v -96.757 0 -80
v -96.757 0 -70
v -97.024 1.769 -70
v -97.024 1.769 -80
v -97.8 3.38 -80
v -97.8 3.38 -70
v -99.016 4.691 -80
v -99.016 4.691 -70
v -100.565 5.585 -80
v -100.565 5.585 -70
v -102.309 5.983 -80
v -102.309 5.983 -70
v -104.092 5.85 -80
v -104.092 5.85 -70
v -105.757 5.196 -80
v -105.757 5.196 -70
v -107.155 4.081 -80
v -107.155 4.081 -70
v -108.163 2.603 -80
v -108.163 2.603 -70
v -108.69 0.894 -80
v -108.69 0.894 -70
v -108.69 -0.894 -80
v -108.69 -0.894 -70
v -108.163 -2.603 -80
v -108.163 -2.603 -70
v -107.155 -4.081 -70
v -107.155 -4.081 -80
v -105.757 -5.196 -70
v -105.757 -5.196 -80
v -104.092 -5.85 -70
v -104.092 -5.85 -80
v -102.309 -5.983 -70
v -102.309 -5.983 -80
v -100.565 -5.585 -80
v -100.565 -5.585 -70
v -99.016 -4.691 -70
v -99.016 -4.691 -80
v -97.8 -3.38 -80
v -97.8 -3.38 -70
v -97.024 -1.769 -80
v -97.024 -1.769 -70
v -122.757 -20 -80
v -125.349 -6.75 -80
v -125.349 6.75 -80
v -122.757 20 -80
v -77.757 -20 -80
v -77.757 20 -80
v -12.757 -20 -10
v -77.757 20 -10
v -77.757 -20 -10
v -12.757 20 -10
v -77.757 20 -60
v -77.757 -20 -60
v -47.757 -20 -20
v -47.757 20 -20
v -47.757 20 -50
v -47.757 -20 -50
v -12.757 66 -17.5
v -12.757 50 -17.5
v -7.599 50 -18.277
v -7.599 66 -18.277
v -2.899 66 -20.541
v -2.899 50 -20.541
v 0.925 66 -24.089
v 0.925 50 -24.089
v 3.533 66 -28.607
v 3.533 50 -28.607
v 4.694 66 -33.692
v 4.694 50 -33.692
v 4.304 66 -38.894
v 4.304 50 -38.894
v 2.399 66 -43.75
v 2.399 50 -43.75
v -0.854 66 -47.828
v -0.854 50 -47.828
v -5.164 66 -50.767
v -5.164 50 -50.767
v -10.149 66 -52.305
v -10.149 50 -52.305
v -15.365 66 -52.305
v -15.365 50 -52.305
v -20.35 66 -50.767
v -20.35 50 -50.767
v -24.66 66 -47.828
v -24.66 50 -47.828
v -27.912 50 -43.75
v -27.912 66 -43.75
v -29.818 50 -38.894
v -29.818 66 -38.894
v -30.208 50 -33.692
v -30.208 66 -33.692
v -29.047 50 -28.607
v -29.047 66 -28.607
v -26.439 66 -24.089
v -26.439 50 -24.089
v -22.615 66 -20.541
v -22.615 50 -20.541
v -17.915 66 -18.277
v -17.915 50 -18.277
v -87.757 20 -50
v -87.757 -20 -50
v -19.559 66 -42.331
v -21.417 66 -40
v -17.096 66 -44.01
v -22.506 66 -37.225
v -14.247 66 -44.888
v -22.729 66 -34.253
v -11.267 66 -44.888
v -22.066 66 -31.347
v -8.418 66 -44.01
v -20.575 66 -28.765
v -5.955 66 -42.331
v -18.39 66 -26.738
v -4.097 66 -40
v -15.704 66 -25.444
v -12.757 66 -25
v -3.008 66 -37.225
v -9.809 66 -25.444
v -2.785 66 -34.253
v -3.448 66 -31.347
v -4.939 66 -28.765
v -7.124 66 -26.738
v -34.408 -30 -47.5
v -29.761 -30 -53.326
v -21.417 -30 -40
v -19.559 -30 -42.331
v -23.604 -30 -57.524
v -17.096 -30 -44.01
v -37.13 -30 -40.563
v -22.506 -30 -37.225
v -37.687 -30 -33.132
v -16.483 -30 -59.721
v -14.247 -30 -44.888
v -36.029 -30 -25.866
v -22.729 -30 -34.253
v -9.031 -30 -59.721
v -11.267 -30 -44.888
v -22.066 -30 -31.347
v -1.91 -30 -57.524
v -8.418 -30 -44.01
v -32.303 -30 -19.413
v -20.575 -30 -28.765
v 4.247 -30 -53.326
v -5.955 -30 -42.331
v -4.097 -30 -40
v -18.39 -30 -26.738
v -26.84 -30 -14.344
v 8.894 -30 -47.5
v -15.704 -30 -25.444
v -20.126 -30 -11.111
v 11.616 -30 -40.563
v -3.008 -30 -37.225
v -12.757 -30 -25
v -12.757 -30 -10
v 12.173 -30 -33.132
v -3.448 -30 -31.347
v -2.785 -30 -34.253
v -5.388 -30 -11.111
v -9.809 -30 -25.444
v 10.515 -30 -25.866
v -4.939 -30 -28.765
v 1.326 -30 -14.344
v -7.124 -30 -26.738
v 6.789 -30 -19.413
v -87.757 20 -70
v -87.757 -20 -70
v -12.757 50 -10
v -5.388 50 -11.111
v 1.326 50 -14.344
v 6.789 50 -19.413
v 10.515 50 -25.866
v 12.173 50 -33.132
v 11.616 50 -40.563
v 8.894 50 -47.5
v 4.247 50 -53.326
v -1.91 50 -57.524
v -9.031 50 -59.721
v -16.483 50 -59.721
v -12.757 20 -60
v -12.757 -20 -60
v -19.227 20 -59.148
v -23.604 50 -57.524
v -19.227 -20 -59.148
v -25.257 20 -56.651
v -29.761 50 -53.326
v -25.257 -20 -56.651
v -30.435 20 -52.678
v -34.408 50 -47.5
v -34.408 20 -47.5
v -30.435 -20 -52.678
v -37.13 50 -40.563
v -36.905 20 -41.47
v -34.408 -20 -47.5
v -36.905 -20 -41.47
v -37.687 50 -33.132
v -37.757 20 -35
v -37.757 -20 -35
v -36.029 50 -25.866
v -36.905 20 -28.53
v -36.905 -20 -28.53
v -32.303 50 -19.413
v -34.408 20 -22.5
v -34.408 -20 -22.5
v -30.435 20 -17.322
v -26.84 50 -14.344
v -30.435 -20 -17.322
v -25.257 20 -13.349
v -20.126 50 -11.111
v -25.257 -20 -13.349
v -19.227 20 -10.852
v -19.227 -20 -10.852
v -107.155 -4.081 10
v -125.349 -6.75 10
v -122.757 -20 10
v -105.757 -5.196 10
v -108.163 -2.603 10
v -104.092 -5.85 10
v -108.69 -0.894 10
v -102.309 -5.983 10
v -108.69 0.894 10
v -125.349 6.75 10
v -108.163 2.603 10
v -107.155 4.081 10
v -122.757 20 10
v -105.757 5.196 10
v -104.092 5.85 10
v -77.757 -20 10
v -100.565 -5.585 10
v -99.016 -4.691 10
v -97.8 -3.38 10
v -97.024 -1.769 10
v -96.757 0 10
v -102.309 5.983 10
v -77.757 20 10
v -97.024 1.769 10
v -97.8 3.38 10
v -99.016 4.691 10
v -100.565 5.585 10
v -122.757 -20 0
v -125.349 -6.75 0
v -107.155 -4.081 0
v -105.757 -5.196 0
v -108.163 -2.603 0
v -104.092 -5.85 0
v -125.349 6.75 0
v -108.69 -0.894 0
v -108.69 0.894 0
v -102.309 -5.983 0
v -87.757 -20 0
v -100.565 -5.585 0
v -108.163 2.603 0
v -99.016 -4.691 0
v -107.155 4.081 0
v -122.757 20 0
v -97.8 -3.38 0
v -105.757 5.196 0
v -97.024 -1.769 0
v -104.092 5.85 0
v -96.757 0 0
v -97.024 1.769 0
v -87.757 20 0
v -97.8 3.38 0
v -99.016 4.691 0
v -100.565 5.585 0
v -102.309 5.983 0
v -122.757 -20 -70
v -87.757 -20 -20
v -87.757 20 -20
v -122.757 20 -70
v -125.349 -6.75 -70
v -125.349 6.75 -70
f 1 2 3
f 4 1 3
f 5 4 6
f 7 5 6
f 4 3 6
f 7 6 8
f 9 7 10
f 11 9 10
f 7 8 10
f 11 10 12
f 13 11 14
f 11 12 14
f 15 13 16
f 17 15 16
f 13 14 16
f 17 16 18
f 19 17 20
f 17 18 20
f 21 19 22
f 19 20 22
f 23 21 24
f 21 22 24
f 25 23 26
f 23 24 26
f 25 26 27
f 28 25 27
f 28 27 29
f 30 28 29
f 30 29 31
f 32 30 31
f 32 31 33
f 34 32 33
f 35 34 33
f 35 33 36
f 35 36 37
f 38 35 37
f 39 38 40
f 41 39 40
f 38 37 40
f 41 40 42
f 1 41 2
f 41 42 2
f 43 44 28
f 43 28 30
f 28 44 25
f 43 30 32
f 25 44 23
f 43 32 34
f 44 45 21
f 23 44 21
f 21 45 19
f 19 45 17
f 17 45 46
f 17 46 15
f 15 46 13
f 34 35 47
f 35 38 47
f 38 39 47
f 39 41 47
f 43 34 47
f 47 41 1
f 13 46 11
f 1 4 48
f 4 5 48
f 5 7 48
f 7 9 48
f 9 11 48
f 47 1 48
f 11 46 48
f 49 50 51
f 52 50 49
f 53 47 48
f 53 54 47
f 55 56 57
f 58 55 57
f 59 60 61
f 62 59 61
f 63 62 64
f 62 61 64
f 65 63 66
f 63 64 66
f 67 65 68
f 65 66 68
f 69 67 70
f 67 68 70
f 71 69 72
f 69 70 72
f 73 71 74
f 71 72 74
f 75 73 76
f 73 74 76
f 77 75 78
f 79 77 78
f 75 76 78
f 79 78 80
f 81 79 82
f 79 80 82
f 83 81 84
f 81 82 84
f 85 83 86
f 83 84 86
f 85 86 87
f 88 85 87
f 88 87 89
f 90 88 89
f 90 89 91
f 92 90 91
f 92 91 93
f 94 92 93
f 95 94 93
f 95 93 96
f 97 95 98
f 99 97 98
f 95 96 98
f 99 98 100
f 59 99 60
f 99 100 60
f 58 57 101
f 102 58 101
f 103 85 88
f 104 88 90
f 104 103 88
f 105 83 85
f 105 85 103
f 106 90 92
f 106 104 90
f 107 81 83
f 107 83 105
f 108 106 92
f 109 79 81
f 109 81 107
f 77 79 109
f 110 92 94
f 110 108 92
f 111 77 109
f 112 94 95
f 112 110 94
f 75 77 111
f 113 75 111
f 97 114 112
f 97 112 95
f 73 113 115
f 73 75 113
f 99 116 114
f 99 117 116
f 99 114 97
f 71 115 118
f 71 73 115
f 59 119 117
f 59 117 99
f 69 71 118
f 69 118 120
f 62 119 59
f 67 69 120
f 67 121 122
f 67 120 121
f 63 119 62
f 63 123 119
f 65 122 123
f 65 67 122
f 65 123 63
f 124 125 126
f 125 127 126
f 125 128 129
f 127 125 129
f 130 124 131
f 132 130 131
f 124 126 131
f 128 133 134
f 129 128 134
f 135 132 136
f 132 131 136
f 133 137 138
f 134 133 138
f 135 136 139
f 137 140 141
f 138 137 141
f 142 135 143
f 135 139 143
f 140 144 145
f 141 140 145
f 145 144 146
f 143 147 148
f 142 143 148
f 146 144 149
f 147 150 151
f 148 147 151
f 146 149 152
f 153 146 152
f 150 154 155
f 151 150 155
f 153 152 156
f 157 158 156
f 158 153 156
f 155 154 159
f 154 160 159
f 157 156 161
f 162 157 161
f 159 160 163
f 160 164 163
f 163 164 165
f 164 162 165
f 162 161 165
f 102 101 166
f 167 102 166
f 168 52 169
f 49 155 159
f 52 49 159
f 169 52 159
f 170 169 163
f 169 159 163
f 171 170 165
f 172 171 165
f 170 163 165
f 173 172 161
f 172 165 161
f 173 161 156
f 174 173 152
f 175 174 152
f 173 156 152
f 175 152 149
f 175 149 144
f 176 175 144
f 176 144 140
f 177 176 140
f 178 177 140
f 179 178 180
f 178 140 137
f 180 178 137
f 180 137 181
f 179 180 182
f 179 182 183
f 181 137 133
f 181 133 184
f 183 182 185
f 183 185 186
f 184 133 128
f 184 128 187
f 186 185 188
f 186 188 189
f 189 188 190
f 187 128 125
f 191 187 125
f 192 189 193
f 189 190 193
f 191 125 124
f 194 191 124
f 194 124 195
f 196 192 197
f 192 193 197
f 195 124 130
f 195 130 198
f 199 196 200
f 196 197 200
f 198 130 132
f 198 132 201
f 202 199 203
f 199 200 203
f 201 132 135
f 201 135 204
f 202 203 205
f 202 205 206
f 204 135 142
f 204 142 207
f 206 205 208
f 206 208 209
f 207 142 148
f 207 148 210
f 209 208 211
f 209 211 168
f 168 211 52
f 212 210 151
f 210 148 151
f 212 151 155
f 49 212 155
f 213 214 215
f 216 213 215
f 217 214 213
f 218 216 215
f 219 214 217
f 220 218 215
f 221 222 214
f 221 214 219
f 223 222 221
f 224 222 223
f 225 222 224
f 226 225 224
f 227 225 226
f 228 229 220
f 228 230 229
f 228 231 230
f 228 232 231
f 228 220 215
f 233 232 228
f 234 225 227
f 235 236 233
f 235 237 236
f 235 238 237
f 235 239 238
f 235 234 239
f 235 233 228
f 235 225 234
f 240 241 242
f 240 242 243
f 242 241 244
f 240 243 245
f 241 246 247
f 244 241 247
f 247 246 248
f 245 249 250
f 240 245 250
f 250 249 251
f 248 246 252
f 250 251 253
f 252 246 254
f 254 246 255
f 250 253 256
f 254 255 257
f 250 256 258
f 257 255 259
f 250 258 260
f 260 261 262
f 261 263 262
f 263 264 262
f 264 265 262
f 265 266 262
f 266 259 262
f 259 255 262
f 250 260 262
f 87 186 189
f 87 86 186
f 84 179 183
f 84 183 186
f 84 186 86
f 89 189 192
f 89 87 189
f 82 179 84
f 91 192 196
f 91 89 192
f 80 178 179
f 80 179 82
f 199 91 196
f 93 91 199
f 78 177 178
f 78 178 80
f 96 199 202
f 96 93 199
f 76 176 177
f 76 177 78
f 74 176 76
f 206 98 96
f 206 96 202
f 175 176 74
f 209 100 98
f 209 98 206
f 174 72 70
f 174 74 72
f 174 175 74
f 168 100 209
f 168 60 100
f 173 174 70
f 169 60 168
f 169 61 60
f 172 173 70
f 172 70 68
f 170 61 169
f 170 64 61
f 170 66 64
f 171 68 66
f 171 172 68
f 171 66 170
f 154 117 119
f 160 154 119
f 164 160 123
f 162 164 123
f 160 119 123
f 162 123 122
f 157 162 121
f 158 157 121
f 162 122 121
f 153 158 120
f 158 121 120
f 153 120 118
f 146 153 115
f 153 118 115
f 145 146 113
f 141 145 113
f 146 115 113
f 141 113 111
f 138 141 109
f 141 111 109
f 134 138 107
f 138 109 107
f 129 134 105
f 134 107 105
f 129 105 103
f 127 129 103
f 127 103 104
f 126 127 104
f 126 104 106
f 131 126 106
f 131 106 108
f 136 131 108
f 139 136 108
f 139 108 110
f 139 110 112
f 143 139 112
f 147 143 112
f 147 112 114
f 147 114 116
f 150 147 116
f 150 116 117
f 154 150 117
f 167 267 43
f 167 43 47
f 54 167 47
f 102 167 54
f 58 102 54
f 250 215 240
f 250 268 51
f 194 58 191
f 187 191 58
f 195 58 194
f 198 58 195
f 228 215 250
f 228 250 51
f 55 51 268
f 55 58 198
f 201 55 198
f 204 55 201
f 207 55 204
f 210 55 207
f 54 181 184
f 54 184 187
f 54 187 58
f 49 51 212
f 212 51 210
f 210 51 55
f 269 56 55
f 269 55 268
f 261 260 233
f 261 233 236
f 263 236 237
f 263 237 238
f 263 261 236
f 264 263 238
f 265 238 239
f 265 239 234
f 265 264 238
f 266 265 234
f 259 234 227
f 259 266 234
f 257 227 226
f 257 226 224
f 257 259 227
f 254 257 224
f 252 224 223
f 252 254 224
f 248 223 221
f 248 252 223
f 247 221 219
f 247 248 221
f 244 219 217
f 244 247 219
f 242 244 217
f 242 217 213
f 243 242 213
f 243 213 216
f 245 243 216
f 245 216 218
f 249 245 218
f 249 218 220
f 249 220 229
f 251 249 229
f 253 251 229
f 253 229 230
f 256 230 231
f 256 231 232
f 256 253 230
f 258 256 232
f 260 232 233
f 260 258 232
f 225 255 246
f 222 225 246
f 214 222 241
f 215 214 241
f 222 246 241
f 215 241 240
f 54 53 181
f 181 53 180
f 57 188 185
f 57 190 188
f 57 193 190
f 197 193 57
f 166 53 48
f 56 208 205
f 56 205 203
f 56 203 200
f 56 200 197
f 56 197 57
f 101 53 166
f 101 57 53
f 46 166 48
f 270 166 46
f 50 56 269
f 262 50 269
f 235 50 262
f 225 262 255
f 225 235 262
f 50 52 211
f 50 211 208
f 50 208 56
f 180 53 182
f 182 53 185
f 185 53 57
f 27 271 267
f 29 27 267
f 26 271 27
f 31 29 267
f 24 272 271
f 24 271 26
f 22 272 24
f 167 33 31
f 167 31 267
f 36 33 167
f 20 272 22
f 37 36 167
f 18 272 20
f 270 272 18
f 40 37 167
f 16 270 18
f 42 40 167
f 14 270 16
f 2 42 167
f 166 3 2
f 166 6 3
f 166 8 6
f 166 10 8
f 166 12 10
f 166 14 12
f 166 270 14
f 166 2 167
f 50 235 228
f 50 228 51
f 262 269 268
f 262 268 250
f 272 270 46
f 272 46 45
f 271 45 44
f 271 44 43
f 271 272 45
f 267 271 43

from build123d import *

# Parameters (mm, degrees)
SKETCH1_R                = 6
BOSS_EXTRUDE1_DEPTH      = 10
BOSS_EXTRUDE2_DEPTH      = 40
BOSS_EXTRUDE3_DEPTH      = 30
BOSS_EXTRUDE3_DEPTH_BACK = 50
SKETCH2_3_R              = 25
SKETCH3_R                = 17.5
BOSS_EXTRUDE4_DEPTH      = 16
SKETCH4_R                = 10
CUT_EXTRUDE1_DEPTH       = 143


with BuildPart() as part:
    # Sketch1 → Boss-Extrude1 (new body)
    with BuildSketch(Plane.XY):
        with BuildLine():
            Line((-77.756941547, 20), (-122.756941547, 20))
            ThreePointArc((-122.756941547, 20), (-125.674902222, 0), (-122.756941547, -20))
            Line((-122.756941547, -20), (-77.756941547, -20))
            Line((-77.756941547, -20), (-77.756941547, 20))
        make_face()
        with Locations((-102.756941547, 0)):
            Circle(SKETCH1_R, mode=Mode.SUBTRACT)
    boss_extrude1 = extrude(amount=BOSS_EXTRUDE1_DEPTH)

    # Sketch2 → Boss-Extrude2 (add)
    with BuildSketch(Plane(origin=(0, 20, 0), x_dir=(1, 0, 0), z_dir=(0, 1, 0))):
        with BuildLine():
            Line((-87.756941547, 0), (-77.756941547, 0))
            Line((-77.756941547, 0), (-77.756941547, 10))
            Line((-77.756941547, 10), (-12.756941547, 10))
            ThreePointArc((-12.756941547, 10), (-30.434611076, 17.32233047), (-37.756941547, 35))
            Line((-37.756941547, 35), (-47.756941547, 35))
            Line((-47.756941547, 35), (-47.756941547, 20))
            Line((-47.756941547, 20), (-87.756941547, 20))
            Line((-87.756941547, 20), (-87.756941547, 0))
        make_face()
    boss_extrude2 = extrude(amount=-BOSS_EXTRUDE2_DEPTH)

    # Sketch2<3> → Boss-Extrude3 (add, two sides: drawn at the far end of the back side and taken through both)
    with BuildSketch(Plane(origin=(0, 20, 0), x_dir=(1, 0, 0), z_dir=(0, 1, 0)).offset(-BOSS_EXTRUDE3_DEPTH_BACK)):
        with Locations(Location((-12.756941547, 35, 0), (0, 0, 270))):
            Circle(SKETCH2_3_R)
    extrude(amount=BOSS_EXTRUDE3_DEPTH + BOSS_EXTRUDE3_DEPTH_BACK)

    # Sketch3 → Boss-Extrude4 (add)
    with BuildSketch(Plane(origin=(0, 50, 0), x_dir=(1, 0, 0), z_dir=(0, 1, 0))):
        with Locations(Location((-12.756941547, 35, 0), (0, 0, 270))):
            Circle(SKETCH3_R)
    extrude(amount=BOSS_EXTRUDE4_DEPTH)

    # Sketch4 → Cut-Extrude1 (cut)
    with BuildSketch(Plane(origin=(0, 66, 0), x_dir=(1, 0, 0), z_dir=(0, 1, 0))):
        with Locations(Location((-12.756941547, 35, 0), (0, 0, 270))):
            Circle(SKETCH4_R)
    extrude(amount=-CUT_EXTRUDE1_DEPTH, mode=Mode.SUBTRACT)

    # Mirror11: Boss-Extrude2 across plane
    add(boss_extrude2.mirror(Plane(origin=(0, 0, -35), x_dir=(1, 0, 0), z_dir=(0, 0, -1))))

    # Mirror12: Boss-Extrude1 across plane
    add(boss_extrude1.mirror(Plane(origin=(0, 0, -35), x_dir=(1, 0, 0), z_dir=(0, 0, -1))))


solid = part.part
